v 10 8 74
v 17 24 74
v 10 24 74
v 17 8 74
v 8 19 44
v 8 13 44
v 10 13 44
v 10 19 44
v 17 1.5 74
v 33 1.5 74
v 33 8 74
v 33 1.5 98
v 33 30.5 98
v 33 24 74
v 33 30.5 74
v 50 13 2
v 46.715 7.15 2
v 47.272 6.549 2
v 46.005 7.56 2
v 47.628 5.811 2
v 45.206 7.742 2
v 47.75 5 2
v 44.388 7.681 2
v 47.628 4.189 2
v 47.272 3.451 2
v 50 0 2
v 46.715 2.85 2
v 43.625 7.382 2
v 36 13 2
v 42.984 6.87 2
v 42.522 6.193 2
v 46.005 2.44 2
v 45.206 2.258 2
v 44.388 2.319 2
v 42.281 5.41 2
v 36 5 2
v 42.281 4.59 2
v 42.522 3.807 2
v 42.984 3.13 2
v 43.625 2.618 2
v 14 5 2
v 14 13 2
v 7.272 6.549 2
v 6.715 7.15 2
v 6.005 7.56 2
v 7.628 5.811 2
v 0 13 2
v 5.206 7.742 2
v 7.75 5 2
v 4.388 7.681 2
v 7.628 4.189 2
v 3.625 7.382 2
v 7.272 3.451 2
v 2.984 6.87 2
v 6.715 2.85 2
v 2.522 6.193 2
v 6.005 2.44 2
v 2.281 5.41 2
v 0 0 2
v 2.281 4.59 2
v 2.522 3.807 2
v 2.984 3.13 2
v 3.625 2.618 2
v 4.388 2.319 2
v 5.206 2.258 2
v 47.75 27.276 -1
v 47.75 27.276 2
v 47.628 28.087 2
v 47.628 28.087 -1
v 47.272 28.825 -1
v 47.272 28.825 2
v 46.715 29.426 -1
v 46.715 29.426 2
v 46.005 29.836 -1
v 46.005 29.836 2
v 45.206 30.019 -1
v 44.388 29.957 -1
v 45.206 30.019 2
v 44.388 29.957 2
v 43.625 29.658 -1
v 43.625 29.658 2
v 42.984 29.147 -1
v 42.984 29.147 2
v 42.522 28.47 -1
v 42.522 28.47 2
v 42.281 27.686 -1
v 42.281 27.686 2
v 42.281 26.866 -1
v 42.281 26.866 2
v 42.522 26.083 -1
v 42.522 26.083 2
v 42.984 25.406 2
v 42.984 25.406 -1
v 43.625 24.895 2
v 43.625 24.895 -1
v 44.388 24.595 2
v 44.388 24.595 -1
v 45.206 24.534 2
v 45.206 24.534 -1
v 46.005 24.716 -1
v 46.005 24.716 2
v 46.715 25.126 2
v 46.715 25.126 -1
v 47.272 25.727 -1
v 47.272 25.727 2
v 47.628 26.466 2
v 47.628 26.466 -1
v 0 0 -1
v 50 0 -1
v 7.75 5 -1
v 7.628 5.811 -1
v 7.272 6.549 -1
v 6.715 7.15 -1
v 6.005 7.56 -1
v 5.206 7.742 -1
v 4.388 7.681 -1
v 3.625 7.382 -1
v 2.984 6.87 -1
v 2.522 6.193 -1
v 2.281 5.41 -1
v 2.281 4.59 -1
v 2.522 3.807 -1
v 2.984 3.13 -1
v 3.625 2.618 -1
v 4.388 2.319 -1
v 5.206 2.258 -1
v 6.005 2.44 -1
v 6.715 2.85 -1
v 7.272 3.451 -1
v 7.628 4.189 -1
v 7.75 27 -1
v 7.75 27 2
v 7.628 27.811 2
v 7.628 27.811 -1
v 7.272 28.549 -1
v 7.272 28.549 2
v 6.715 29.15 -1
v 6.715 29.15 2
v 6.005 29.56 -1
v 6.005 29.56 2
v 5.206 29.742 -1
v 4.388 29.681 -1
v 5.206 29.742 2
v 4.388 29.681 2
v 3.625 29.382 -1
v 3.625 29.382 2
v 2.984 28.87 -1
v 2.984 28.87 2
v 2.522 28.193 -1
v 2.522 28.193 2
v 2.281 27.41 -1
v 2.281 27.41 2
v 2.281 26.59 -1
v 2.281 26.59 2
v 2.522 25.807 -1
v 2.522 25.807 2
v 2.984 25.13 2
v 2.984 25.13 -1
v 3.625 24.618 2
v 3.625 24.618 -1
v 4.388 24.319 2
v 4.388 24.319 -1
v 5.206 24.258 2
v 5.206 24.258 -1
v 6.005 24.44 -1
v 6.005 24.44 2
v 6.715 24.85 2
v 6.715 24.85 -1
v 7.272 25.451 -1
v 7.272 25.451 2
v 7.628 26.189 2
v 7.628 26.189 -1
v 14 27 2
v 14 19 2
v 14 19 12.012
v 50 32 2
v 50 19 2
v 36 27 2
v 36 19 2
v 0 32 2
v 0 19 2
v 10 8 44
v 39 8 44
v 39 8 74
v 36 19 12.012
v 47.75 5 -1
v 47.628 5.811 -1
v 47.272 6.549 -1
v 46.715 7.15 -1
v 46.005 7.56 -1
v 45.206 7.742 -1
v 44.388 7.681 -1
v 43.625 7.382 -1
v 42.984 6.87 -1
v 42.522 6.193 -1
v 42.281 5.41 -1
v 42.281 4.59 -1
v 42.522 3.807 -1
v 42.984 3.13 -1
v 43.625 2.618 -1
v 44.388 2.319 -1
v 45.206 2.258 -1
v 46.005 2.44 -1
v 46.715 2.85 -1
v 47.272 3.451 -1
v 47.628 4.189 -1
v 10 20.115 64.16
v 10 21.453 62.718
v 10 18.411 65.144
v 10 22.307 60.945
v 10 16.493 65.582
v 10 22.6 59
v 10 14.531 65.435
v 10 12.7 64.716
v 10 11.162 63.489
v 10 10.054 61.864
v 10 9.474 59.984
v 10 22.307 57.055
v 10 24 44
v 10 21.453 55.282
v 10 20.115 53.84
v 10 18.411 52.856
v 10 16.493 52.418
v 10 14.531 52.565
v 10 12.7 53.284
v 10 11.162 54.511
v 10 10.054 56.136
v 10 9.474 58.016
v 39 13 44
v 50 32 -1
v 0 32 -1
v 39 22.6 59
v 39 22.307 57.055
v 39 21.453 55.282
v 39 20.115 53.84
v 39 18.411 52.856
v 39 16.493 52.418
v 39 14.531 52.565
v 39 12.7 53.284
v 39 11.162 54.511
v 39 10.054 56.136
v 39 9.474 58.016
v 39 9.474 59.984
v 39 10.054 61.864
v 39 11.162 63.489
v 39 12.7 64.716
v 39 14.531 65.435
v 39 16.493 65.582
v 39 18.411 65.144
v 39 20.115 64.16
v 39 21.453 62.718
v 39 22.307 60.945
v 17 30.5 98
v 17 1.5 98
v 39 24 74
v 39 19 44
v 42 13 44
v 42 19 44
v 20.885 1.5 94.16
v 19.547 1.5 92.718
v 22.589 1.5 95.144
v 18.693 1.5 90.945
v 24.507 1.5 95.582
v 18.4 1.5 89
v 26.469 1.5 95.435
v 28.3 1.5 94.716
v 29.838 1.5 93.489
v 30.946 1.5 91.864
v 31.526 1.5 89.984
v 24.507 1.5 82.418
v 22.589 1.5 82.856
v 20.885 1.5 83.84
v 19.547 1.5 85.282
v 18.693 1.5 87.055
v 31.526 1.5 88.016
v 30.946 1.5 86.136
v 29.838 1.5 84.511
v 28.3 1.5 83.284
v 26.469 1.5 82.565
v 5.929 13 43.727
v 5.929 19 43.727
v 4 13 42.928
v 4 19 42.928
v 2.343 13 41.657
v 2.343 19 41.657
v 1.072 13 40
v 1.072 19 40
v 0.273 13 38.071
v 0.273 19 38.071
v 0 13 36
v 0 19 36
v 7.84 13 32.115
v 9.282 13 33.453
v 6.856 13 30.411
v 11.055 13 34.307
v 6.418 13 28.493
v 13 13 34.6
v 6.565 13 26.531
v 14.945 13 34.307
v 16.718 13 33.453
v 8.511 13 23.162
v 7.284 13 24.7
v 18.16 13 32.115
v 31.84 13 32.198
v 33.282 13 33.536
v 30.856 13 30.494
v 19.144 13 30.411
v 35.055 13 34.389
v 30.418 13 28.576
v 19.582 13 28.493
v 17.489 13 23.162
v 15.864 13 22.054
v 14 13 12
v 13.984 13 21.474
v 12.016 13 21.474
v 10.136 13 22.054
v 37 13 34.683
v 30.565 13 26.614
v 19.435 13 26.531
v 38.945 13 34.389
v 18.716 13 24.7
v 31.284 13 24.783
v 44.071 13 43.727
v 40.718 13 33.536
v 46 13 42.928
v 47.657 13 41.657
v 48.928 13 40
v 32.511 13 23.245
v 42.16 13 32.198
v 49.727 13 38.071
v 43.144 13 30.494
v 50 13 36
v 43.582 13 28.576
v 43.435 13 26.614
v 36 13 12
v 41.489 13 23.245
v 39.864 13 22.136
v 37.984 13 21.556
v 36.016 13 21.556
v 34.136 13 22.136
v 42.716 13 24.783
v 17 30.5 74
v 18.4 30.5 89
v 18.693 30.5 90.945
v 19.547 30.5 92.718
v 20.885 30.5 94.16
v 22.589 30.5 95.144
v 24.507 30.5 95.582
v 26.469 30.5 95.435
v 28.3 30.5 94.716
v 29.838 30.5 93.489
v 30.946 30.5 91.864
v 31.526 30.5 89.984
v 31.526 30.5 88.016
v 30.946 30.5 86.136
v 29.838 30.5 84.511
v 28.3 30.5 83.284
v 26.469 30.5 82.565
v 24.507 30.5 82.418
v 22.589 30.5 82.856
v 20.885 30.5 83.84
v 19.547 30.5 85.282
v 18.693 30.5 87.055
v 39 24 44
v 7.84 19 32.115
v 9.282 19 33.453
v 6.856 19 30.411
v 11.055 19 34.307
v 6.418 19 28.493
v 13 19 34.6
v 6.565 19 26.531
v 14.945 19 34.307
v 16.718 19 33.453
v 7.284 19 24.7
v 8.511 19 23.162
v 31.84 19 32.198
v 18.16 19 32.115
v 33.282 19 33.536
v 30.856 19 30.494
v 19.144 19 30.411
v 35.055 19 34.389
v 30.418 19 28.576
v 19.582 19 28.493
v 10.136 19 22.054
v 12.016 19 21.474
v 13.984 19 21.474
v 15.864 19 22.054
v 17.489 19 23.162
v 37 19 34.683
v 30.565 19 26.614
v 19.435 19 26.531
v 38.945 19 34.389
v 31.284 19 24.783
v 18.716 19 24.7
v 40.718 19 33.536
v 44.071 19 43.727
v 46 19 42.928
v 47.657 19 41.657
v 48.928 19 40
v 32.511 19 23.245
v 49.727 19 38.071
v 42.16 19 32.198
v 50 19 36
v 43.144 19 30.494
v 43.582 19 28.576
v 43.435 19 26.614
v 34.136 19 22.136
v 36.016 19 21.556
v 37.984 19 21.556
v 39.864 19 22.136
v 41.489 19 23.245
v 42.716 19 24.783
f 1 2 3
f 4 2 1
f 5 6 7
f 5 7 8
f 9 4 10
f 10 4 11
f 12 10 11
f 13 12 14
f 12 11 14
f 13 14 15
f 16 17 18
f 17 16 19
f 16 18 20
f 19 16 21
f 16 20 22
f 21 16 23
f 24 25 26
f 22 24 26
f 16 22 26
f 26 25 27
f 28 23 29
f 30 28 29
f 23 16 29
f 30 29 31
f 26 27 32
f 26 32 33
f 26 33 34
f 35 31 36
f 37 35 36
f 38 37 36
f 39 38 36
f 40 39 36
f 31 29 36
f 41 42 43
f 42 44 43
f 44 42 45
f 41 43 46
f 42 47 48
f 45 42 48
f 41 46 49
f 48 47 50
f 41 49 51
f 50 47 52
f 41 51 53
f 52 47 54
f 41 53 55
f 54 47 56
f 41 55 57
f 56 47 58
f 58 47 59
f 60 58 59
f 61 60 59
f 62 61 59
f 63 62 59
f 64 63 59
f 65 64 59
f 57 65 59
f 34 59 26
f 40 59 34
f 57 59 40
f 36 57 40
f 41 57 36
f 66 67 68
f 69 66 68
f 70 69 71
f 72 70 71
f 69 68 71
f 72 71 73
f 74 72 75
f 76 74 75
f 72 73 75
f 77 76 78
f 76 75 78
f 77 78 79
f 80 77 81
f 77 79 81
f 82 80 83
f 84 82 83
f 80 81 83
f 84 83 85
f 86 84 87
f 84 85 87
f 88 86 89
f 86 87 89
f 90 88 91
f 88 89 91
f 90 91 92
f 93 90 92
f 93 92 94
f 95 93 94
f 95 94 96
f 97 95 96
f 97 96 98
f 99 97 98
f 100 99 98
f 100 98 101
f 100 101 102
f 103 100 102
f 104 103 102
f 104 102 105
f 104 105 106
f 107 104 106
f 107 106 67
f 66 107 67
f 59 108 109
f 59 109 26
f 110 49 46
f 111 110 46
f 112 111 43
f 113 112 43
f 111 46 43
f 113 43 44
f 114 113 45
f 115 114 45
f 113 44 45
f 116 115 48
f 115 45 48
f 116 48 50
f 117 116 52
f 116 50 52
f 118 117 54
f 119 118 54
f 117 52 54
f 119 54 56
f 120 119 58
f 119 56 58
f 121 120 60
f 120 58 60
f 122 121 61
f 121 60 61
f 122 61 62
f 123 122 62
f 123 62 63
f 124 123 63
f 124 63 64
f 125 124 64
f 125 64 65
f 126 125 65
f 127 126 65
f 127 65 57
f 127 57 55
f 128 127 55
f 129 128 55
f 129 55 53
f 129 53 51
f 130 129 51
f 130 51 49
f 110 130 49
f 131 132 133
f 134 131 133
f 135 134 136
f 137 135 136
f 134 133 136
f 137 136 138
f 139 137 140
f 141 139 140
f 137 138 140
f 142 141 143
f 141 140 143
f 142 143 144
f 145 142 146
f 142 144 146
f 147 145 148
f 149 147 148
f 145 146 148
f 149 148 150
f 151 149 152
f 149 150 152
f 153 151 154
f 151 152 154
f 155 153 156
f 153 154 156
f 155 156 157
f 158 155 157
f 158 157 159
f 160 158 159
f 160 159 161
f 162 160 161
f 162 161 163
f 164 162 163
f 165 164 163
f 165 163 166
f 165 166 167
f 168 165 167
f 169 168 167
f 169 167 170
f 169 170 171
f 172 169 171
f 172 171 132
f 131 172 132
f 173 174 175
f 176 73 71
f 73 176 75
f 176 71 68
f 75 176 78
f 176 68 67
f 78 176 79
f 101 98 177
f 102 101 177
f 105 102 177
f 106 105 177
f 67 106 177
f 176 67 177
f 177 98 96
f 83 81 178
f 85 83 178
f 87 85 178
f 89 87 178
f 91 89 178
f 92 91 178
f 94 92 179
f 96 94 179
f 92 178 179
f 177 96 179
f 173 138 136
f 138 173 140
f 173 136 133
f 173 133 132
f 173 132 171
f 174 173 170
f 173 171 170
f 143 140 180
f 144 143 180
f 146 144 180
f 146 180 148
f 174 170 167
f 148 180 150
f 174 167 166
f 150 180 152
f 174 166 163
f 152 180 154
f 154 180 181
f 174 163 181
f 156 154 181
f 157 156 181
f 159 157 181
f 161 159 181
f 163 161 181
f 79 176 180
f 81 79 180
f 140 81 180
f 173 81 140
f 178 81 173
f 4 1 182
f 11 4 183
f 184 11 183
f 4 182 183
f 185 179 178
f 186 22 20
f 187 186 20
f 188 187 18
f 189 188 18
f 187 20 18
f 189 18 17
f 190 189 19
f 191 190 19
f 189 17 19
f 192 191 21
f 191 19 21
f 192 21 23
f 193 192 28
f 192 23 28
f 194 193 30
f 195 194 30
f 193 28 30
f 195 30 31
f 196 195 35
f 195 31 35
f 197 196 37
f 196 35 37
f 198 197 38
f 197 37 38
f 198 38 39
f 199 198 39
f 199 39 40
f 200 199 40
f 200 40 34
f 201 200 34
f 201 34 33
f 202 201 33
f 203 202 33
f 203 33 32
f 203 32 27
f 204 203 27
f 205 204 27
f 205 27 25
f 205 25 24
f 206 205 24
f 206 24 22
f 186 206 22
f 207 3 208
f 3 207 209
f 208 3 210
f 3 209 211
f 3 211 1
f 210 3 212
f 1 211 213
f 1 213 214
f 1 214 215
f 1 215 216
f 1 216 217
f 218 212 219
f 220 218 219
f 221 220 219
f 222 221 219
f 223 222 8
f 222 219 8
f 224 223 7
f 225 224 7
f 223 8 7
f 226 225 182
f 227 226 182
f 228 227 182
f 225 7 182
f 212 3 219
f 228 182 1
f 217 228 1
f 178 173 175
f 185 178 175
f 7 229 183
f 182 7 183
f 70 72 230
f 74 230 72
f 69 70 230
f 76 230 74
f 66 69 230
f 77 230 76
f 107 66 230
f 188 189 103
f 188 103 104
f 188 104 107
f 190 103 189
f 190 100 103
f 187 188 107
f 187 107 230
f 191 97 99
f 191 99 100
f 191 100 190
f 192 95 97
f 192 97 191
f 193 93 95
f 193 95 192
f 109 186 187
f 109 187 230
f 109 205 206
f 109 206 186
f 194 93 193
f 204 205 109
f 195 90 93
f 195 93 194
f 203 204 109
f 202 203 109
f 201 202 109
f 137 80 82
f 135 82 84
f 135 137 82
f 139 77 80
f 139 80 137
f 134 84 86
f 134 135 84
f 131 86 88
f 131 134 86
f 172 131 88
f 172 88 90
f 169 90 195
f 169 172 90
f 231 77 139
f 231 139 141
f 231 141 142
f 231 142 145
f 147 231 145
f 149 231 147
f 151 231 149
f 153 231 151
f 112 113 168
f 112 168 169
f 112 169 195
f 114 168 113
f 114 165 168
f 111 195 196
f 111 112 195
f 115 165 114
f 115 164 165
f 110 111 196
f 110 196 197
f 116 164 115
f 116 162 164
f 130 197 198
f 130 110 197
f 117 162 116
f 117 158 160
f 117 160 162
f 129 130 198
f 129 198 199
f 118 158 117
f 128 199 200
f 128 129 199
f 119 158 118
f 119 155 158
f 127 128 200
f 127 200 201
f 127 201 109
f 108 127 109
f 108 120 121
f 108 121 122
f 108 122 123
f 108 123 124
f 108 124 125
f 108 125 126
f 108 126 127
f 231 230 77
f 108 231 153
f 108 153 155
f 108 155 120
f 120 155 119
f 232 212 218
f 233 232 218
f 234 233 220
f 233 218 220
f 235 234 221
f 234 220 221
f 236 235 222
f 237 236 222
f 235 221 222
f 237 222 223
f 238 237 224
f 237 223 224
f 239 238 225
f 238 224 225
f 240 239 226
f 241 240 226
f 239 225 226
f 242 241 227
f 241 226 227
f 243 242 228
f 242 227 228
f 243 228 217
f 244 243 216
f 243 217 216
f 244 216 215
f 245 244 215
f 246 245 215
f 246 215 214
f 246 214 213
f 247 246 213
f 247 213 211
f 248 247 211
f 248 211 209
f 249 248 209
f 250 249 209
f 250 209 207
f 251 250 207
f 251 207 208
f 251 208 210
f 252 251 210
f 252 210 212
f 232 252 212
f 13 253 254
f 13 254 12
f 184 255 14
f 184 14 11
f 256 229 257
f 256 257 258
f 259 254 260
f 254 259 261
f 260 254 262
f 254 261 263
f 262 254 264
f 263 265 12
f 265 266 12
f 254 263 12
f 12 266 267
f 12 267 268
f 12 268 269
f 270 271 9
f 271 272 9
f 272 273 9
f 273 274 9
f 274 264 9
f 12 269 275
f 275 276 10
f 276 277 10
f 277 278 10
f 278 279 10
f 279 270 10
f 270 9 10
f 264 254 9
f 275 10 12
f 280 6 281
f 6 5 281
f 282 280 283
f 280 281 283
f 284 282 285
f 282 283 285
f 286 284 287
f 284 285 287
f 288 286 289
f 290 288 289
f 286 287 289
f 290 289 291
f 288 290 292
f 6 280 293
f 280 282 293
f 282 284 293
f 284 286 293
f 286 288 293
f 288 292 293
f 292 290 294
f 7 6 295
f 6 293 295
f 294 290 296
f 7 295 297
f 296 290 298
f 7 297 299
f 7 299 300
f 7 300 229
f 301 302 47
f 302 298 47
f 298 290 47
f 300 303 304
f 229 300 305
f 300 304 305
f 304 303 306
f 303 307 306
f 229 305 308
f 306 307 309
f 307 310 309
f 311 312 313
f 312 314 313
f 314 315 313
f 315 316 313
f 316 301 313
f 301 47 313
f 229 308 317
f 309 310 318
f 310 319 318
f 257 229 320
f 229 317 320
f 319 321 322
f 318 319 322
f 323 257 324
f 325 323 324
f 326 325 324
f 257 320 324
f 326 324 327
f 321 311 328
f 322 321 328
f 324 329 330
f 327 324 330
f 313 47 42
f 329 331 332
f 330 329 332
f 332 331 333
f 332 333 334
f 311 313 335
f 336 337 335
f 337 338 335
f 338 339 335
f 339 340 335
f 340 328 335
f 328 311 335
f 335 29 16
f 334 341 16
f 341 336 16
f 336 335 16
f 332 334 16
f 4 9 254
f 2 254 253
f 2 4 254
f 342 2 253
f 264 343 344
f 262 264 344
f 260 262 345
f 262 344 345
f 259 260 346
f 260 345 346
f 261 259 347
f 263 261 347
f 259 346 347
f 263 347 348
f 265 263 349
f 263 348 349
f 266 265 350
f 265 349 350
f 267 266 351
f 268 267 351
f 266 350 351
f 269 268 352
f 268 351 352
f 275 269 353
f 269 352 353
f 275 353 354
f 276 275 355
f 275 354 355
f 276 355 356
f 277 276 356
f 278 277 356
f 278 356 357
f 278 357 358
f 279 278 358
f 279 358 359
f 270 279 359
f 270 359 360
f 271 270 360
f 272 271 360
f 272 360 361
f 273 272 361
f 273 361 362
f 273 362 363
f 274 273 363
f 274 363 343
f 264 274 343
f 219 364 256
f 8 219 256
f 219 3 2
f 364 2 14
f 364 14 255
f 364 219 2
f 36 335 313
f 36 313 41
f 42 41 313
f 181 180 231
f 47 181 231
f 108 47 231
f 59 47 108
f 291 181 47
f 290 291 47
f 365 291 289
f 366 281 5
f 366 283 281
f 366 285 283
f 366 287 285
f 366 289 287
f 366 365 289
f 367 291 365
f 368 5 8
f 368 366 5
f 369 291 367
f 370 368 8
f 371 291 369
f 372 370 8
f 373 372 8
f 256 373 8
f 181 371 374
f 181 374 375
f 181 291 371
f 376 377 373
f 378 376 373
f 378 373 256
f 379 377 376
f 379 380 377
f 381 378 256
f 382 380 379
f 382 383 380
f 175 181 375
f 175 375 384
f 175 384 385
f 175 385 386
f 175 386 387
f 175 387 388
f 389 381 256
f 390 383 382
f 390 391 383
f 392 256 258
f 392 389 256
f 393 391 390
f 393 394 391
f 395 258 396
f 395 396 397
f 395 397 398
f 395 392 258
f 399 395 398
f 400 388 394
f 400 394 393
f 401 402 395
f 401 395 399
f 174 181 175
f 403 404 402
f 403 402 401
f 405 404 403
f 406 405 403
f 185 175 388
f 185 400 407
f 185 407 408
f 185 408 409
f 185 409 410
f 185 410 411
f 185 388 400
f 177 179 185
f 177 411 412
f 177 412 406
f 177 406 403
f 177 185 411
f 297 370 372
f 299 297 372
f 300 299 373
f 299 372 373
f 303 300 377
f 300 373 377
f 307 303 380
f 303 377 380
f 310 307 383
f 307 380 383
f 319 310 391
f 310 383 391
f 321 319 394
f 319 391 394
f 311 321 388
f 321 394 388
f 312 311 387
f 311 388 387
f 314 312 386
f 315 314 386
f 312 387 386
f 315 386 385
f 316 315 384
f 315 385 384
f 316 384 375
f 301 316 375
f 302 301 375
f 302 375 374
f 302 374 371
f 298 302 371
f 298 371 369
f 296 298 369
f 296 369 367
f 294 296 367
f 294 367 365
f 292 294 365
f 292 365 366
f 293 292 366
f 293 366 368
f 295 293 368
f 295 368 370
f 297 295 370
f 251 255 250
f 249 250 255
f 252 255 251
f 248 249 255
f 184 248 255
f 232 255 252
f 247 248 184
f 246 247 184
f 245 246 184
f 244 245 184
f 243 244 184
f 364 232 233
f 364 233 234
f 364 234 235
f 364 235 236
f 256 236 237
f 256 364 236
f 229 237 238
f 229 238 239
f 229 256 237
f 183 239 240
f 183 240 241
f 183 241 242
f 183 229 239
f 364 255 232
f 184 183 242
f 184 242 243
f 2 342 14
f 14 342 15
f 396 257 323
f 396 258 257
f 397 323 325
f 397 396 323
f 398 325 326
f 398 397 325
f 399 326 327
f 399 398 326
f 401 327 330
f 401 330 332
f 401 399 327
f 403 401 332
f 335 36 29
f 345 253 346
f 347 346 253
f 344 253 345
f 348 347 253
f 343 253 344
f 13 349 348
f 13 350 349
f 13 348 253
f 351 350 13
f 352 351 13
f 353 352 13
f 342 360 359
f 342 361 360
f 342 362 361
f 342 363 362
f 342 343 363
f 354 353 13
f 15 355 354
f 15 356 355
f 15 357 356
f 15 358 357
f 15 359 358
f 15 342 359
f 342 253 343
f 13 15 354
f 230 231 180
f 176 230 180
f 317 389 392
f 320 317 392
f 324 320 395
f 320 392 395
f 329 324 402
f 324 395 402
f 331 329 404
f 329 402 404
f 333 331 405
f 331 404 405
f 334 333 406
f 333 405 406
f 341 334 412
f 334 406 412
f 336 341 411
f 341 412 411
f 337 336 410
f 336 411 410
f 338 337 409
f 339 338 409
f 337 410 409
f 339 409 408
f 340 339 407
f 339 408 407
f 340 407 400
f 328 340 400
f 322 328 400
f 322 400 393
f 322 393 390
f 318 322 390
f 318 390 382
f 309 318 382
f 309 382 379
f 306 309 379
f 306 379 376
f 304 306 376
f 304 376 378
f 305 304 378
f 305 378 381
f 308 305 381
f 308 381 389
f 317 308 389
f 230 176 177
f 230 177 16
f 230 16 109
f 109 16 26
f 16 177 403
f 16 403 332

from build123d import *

# Parameters (mm, degrees)
PAD001_DEPTH  = 50
PAD002_DEPTH  = 50
SKETCH005_W   = 14
SKETCH005_H   = 13
PAD004_DEPTH  = 20
SKETCH006_W   = 14
SKETCH006_H   = 13
PAD005_DEPTH  = 20
SKETCH007_W   = 14
SKETCH007_H   = 13
PAD006_DEPTH  = 20
SKETCH008_W   = 14
SKETCH008_H   = 13
PAD007_DEPTH  = 20
SKETCH003_W   = 32
SKETCH003_H   = 3
PAD003_DEPTH  = 50
SKETCH004_R   = 2.75
HOLE_DEPTH    = 3.001
SKETCH009_W   = 16
SKETCH009_H   = 29
PAD008_DEPTH  = 30
SKETCH010_R   = 6.6
HOLE001_DEPTH = 29.001
SKETCH011_W   = 16
SKETCH011_H   = 29
PAD009_DEPTH  = 24
SKETCH012_R   = 6.6
HOLE002_DEPTH = 29.001001
SKETCH_W      = 32
SKETCH_H      = 42
PAD_DEPTH     = 50
SKETCH014_R   = 6.6
HOLE004_DEPTH = 32.001
FILLET_R      = 8
FILLET001_R   = 8


with BuildPart() as body001:
    # Sketch001 (on Face1 of CopyPad) → Pad001 (new body)
    with BuildSketch(Plane.YZ.offset(50)):
        Polygon((19, 44), (32, 44), (32, 2), (27, 2), (19, 12.011942), align=None)
    extrude(amount=-PAD001_DEPTH)


with BuildPart() as body002:
    # Sketch002 (on Face1 of CopyPad001) → Pad002 (new body)
    with BuildSketch(Plane.YZ.offset(50)):
        Polygon((13, 44), (13, 12), (5, 2), (0, 2), (0, 44), align=None)
    extrude(amount=-PAD002_DEPTH)


with BuildPart() as body004:
    # Sketch005 (on Face1 of CopyHole) → Pad004 (new body)
    with BuildSketch(Plane.XY.offset(2)):
        with Locations((7, 6.5)):
            Rectangle(SKETCH005_W, SKETCH005_H)
    extrude(amount=PAD004_DEPTH)


with BuildPart() as body005:
    # Sketch006 (on Face1 of CopyHole001) → Pad005 (new body)
    with BuildSketch(Plane.XY.offset(2)):
        with Locations((7, 25.5)):
            Rectangle(SKETCH006_W, SKETCH006_H)
    extrude(amount=PAD005_DEPTH)


with BuildPart() as body006:
    # Sketch007 (on Face1 of CopyHole002) → Pad006 (new body)
    with BuildSketch(Plane.XY.offset(2)):
        with Locations((43, 6.5)):
            Rectangle(SKETCH007_W, SKETCH007_H)
    extrude(amount=PAD006_DEPTH)


with BuildPart() as body007:
    # Sketch008 (on Face1 of CopyHole003) → Pad007 (new body)
    with BuildSketch(Plane.XY.offset(2)):
        with Locations((43, 25.5)):
            Rectangle(SKETCH008_W, SKETCH008_H)
    extrude(amount=PAD007_DEPTH)


with BuildPart() as body003:
    # Sketch003 (on Face1 of CopyPad002) → Pad003 (new body)
    with BuildSketch(Plane(origin=(0, 0, 0), x_dir=(0, -1, 0), z_dir=(-1, 0, 0))):
        with Locations((-16, 0.5)):
            Rectangle(SKETCH003_W, SKETCH003_H)
    extrude(amount=-PAD003_DEPTH)

    # Sketch004 (on Face1 of Pad003) → Hole (cut, through all)
    with BuildSketch(Plane.XY.offset(2)):
        with Locations((5, 27)):
            Circle(SKETCH004_R)
        with Locations((5, 5)):
            Circle(SKETCH004_R)
        with Locations((45, 5)):
            Circle(SKETCH004_R)
        with Locations((45, 27.276354)):
            Circle(SKETCH004_R)
    extrude(amount=-HOLE_DEPTH, mode=Mode.SUBTRACT)


with BuildPart() as body008:
    # Sketch009 (on Face1 of CopyPad003) → Pad008 (new body)
    with BuildSketch(Plane(origin=(0, 0, 44), x_dir=(0, -1, 0), z_dir=(0, 0, 1))):
        with Locations((-16, 24.5)):
            Rectangle(SKETCH009_W, SKETCH009_H)
    extrude(amount=PAD008_DEPTH)

    # Sketch010 (on Face1 of Pad008) → Hole001 (cut, through all)
    with BuildSketch(Plane(origin=(10, 0, 0), x_dir=(0, 1, 0), z_dir=(-1, 0, 0))):
        with Locations((16, -59)):
            Circle(SKETCH010_R)
    extrude(amount=-HOLE001_DEPTH, mode=Mode.SUBTRACT)


with BuildPart() as body009:
    # Sketch011 (on Face1 of CopyHole001001) → Pad009 (new body)
    with BuildSketch(Plane.XY.offset(74)):
        with Locations((25, 16)):
            Rectangle(SKETCH011_W, SKETCH011_H)
    extrude(amount=PAD009_DEPTH)

    # Sketch012 (on Face1 of Pad009) → Hole002 (cut, through all)
    with BuildSketch(Plane(origin=(-1e-06, 30.5, 30.000001), x_dir=(-1, 0, 0), z_dir=(0, 1, 0))):
        with Locations((-25, 59)):
            Circle(SKETCH012_R)
    extrude(amount=-HOLE002_DEPTH, mode=Mode.SUBTRACT)


with BuildPart() as body:
    # Sketch → Pad (new body)
    with BuildSketch(Plane.YZ):
        with Locations((16, 23)):
            Rectangle(SKETCH_W, SKETCH_H)
    extrude(amount=PAD_DEPTH)

    # Sketch014 (on Face2 of Pad) → Hole004 (cut, through all)
    with BuildSketch(Plane.ZX.offset(32)):
        with Locations((28.082674, 37)):
            Circle(SKETCH014_R)
        with Locations((28, 13)):
            Circle(SKETCH014_R)
    extrude(amount=-HOLE004_DEPTH, mode=Mode.SUBTRACT)

    # Boolean: cut Body001
    add(body001.part, mode=Mode.SUBTRACT)

    # Boolean001: cut Body002
    add(body002.part, mode=Mode.SUBTRACT)

    # Boolean002: cut Body004
    add(body004.part, mode=Mode.SUBTRACT)

    # Boolean003: cut Body005
    add(body005.part, mode=Mode.SUBTRACT)

    # Boolean004: cut Body006
    add(body006.part, mode=Mode.SUBTRACT)

    # Boolean005: cut Body007
    add(body007.part, mode=Mode.SUBTRACT)

    # Boolean006: union Body003
    add(body003.part)

    # Boolean007: union Body008, Body009
    add(body008.part)
    add(body009.part)

    # Fillet
    fillet_edges = [body.edges().sort_by_distance(p)[0] for p in [
        (50, 16, 44),
    ]]
    fillet(fillet_edges, radius=FILLET_R)

    # Fillet001
    fillet001_edges = [body.edges().sort_by_distance(p)[0] for p in [
        (0, 16, 44),
    ]]
    fillet(fillet001_edges, radius=FILLET001_R)


solid = body.part
